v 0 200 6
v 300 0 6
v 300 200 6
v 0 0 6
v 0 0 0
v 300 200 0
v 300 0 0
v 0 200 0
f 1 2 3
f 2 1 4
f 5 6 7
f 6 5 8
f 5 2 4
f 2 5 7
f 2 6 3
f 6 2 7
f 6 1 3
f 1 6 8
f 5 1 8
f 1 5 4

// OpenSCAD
$fn = 64;

length = 300;
width  = 200;
thickness = 6;

color([0.78, 0.67, 0.50])
cube([length, width, thickness], center=false);
